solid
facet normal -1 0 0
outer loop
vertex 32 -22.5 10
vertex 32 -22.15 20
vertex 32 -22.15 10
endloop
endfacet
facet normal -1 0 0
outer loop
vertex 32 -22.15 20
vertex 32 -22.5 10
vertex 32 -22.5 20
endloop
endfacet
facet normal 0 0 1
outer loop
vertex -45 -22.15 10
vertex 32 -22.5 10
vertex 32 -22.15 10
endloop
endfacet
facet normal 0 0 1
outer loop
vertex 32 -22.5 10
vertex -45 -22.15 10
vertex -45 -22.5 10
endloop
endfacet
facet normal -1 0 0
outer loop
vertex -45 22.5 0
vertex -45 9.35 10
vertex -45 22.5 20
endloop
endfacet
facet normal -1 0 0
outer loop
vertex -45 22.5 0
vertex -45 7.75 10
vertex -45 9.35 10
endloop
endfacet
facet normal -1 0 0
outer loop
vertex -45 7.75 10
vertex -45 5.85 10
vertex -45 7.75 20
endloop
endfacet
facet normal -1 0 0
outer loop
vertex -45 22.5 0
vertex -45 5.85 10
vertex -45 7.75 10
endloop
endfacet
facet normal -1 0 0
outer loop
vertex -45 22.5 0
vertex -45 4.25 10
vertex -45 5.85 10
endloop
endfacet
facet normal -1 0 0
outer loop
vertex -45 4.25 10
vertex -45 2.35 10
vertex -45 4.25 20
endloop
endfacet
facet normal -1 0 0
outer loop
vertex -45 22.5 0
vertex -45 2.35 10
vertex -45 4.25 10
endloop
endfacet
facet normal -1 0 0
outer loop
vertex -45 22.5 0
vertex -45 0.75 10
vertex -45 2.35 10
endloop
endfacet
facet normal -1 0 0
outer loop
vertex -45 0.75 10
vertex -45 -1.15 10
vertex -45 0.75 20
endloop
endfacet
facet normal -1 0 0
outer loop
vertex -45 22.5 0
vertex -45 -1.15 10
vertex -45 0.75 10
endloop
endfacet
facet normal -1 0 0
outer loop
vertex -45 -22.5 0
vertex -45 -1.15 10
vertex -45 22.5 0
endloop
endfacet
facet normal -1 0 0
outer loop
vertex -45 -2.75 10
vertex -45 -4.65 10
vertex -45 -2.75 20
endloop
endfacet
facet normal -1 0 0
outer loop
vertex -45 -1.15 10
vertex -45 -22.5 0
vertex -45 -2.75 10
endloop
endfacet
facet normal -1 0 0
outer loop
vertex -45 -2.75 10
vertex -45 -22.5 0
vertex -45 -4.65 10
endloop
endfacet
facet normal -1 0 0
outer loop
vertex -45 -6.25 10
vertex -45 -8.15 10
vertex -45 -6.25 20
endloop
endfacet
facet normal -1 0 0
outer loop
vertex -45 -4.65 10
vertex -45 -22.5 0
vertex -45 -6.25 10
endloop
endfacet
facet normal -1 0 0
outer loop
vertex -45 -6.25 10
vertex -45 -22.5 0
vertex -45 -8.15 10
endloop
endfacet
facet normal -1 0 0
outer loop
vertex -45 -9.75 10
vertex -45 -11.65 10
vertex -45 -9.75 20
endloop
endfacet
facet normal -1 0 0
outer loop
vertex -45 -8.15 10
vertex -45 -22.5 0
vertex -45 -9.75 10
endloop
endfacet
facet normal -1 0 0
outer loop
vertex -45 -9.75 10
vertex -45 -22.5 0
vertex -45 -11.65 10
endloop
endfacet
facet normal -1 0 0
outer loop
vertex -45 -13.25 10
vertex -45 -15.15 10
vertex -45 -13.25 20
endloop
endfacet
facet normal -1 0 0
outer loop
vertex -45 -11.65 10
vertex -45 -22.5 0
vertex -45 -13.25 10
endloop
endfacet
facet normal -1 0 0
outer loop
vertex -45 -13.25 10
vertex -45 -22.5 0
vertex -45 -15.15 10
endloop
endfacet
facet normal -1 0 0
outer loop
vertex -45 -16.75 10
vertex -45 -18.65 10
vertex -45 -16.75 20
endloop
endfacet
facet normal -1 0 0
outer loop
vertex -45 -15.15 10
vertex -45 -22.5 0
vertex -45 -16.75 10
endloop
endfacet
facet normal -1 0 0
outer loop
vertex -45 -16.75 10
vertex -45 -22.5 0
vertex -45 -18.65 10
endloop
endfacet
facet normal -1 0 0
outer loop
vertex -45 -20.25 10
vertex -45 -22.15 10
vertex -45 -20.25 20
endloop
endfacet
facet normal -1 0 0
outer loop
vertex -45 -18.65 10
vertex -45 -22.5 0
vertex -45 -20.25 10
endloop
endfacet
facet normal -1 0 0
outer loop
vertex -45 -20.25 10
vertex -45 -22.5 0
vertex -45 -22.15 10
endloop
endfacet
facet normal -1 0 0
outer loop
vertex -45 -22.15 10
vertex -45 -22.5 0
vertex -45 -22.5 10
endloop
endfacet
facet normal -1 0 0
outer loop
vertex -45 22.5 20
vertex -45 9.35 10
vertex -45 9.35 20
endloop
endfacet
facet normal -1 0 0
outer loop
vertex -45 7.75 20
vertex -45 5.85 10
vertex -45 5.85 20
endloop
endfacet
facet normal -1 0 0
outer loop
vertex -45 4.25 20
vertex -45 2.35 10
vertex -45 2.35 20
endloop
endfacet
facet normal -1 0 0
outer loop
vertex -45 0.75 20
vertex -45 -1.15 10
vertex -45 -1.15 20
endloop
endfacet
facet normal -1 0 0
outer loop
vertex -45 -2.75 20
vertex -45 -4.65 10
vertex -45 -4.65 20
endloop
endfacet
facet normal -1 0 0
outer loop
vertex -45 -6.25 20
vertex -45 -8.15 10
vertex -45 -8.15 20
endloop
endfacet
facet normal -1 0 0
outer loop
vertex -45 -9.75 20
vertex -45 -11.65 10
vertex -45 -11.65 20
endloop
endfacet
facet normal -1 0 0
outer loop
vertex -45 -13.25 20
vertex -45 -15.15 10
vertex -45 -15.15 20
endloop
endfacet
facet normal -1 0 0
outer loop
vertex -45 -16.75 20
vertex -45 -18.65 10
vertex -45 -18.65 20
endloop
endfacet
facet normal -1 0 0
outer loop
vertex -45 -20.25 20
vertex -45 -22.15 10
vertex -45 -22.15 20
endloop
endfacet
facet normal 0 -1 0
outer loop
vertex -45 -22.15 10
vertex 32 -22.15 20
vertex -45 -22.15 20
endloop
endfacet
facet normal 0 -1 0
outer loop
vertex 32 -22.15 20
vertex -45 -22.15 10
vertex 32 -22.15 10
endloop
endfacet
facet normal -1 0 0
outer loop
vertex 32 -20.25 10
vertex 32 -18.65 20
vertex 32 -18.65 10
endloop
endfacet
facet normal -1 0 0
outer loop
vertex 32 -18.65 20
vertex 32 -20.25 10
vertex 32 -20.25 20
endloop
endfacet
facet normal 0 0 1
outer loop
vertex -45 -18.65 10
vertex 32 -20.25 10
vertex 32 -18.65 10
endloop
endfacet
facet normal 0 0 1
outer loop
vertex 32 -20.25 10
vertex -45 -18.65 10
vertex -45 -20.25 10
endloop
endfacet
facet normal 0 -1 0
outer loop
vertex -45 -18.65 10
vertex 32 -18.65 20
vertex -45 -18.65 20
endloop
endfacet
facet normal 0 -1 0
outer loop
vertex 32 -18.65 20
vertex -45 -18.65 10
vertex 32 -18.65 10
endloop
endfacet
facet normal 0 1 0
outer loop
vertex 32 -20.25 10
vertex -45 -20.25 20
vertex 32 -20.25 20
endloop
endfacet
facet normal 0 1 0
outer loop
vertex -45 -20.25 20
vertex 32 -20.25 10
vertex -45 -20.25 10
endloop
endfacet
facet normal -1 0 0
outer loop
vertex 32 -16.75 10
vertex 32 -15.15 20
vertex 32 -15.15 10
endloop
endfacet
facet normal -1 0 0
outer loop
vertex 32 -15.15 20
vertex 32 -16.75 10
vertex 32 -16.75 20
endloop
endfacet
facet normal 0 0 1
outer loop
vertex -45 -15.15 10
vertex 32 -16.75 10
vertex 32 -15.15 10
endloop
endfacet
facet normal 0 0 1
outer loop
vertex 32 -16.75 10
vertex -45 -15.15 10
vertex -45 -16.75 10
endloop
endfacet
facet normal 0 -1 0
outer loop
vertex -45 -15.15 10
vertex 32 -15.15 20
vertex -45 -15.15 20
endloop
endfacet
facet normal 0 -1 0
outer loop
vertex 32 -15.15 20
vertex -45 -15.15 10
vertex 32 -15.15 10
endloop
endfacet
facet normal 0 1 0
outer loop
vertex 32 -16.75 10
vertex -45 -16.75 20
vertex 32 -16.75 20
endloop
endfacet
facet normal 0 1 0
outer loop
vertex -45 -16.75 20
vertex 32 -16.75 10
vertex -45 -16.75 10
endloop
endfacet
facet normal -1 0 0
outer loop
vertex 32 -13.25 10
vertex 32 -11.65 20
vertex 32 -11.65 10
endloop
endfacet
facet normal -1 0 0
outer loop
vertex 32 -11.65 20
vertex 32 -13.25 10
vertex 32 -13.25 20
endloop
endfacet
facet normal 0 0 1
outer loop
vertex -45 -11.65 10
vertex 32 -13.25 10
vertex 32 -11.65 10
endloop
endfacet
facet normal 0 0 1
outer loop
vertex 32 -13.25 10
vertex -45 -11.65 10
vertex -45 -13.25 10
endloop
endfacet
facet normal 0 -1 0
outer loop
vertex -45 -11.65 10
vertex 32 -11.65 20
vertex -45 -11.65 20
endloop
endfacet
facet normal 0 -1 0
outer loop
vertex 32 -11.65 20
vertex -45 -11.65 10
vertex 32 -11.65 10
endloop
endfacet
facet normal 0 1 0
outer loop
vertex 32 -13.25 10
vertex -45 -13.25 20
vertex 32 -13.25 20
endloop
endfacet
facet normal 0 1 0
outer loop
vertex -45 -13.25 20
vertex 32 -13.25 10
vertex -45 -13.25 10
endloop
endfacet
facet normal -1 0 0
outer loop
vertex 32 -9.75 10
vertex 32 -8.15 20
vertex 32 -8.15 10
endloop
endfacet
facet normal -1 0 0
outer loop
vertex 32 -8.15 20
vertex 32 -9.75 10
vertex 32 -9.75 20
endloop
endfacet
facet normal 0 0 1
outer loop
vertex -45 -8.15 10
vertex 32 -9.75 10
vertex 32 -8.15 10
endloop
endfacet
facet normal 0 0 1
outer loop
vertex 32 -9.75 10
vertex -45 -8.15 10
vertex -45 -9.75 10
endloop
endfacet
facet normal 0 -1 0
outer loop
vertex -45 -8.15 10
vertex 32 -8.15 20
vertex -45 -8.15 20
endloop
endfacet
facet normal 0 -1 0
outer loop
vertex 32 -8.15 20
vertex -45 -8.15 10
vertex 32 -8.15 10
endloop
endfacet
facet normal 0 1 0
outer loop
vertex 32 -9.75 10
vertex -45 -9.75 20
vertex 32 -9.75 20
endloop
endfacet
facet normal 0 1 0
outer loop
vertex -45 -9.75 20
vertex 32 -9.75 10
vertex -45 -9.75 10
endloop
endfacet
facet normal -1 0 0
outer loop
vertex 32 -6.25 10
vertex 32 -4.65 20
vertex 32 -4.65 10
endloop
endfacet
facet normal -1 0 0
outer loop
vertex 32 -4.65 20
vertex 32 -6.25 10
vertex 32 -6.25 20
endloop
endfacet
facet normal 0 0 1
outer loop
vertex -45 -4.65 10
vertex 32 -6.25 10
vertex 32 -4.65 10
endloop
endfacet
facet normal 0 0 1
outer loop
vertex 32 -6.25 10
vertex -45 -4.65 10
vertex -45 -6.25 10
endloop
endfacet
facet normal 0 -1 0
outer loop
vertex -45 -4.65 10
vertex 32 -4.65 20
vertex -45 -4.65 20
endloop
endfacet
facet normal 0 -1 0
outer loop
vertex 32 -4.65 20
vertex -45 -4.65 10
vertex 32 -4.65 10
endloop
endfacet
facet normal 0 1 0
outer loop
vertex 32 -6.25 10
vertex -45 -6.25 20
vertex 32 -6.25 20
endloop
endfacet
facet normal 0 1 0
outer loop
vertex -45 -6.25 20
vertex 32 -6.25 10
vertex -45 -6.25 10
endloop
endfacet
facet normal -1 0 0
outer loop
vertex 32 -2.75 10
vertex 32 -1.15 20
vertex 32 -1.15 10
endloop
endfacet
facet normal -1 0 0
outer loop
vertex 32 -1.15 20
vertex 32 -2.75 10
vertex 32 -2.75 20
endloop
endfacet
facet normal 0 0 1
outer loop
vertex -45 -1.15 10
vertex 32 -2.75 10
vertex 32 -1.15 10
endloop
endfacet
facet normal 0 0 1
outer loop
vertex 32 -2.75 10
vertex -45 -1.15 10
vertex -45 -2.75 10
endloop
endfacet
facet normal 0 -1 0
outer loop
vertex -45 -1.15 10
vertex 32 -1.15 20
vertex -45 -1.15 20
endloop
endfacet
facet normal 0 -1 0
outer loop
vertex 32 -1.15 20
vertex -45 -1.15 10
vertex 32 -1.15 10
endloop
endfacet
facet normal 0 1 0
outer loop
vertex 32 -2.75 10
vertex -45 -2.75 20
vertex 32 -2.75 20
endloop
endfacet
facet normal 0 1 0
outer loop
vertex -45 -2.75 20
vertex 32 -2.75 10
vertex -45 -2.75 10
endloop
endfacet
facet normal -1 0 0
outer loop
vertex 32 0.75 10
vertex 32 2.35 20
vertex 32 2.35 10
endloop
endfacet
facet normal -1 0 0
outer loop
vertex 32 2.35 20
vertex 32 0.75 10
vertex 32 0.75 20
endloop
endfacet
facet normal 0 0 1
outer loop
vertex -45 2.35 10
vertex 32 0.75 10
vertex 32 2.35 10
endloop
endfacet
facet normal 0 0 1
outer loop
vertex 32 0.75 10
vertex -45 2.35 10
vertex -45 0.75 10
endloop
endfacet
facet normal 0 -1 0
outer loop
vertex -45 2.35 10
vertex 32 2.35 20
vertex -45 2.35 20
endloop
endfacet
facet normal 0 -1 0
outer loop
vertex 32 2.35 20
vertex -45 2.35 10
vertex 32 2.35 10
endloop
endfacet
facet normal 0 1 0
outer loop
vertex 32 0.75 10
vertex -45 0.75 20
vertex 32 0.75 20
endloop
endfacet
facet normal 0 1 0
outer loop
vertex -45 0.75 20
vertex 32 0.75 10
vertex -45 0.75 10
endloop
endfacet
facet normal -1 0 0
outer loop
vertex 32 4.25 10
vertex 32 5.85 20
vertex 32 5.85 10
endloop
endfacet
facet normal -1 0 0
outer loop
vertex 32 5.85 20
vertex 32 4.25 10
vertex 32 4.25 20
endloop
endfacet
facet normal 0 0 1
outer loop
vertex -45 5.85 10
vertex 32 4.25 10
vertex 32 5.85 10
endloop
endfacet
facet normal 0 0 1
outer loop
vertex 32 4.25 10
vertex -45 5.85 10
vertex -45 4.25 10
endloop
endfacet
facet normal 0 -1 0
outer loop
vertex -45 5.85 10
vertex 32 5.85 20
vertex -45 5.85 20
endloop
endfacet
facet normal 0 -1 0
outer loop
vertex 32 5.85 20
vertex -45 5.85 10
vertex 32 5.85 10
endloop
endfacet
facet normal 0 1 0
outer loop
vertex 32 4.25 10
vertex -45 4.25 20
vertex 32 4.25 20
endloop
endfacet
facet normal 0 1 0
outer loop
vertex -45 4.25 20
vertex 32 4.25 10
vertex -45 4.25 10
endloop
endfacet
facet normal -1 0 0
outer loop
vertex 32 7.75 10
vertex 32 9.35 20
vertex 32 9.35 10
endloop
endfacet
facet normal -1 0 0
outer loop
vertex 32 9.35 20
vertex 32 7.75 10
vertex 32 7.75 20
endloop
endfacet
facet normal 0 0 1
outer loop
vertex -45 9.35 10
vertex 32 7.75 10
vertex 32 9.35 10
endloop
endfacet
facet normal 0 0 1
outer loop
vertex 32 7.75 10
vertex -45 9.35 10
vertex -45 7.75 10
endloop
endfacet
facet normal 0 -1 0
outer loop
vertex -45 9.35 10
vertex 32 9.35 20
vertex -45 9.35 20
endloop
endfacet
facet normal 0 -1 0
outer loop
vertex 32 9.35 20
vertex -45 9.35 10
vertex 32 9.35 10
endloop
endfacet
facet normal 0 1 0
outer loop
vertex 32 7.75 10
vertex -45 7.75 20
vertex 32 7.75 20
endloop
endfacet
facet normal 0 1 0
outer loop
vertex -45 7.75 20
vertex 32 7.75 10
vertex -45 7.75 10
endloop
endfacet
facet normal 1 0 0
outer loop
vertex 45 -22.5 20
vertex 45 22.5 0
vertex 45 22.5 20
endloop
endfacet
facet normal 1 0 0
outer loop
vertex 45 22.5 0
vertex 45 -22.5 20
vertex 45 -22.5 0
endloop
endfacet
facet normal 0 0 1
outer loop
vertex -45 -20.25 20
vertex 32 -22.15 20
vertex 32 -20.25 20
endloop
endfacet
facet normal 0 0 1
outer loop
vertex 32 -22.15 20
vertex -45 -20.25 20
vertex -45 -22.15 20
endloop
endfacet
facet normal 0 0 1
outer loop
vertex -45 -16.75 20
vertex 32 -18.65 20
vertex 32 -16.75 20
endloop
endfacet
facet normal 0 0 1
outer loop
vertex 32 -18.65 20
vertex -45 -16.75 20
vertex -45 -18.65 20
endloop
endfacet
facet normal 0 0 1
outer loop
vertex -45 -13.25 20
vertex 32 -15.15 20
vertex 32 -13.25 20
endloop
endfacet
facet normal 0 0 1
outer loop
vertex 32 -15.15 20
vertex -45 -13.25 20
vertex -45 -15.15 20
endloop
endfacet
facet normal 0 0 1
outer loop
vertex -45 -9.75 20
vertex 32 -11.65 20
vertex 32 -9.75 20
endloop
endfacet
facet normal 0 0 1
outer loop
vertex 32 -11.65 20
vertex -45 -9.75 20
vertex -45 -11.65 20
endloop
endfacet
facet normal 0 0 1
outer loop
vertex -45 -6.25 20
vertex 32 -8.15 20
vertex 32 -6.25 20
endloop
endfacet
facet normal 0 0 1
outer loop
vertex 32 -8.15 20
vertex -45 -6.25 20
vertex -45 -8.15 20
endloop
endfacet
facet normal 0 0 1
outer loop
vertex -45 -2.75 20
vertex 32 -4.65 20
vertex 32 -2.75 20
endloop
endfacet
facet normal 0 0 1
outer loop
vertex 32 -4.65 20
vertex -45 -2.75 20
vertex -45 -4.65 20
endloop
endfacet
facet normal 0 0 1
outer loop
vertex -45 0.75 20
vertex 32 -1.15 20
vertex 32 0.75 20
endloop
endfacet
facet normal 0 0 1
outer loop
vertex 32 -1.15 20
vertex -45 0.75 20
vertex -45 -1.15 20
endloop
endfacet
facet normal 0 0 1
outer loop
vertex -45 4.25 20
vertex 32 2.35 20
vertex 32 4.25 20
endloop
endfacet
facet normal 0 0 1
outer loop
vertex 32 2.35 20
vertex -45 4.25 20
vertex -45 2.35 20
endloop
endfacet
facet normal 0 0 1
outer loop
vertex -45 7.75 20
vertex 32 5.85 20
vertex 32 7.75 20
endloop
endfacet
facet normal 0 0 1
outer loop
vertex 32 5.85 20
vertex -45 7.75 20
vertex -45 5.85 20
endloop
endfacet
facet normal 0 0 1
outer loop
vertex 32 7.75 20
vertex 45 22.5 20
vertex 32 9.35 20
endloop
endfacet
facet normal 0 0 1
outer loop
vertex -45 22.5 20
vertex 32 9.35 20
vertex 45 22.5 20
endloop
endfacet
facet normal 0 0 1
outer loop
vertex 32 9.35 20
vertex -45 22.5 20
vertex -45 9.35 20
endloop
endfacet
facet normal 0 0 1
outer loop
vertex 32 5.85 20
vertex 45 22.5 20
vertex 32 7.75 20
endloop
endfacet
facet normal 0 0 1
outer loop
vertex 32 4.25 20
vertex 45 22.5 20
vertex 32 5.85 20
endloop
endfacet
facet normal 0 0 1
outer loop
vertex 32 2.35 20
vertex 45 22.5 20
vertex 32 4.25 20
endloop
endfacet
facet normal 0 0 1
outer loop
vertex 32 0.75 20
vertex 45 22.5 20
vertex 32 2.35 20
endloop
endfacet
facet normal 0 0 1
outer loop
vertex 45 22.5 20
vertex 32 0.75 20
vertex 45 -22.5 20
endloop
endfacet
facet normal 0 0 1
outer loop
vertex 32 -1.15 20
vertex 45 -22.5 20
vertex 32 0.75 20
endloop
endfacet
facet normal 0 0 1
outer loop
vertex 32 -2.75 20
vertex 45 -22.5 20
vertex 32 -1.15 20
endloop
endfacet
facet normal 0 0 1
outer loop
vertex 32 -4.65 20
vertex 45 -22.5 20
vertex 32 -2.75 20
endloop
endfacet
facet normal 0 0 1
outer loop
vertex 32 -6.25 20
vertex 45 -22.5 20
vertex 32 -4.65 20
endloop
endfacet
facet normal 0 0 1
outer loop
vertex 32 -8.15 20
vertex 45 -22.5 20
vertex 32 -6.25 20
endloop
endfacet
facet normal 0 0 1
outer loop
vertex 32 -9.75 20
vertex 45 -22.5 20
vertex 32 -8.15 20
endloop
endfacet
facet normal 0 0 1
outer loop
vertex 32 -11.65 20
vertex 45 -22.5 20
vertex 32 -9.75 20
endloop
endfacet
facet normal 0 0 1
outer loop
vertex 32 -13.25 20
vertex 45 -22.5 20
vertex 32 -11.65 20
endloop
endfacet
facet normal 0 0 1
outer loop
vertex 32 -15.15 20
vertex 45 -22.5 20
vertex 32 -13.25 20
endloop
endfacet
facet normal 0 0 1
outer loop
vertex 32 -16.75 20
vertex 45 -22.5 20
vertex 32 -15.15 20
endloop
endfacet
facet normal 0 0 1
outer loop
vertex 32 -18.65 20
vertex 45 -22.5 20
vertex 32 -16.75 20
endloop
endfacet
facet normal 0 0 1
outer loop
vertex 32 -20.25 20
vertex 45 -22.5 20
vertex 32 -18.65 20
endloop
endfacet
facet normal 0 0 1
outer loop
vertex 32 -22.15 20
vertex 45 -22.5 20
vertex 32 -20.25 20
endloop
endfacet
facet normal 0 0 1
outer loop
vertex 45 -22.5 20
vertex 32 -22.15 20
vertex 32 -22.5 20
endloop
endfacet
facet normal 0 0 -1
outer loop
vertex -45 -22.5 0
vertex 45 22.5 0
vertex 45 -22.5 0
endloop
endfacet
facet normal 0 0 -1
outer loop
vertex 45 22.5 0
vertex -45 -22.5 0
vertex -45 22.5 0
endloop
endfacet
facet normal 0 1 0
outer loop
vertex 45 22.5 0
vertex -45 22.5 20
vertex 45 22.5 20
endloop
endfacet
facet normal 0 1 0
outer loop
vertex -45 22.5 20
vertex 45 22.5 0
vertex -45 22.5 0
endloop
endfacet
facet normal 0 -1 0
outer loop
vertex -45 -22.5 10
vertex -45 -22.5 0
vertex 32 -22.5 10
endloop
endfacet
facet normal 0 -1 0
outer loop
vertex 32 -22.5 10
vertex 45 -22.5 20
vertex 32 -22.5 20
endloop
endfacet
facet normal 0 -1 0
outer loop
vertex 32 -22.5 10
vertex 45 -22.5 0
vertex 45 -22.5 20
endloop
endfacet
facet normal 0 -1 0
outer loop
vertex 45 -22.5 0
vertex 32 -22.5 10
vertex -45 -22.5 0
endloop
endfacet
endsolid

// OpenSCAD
// Drying rack for 10 microscope slides
// Print orientation: base on XY plane, slots open upward (+Z)

// ---------- Block ----------
block_l = 90;    // block length (X)
block_w = 45;    // block width (Y)
block_h = 20;    // block height (Z)

// ---------- Slots ----------
n_slots     = 10;     // number of slots
slot_len    = 77;     // slot length (X)
slot_w      = 1.6;    // slot width (Y)
slot_depth  = 10;     // slot depth from top face (Z)
slot_pitch  = 3.5;    // centre-to-centre spacing in (Y)

// ---------- Misc ----------
eps = 0.5;            // overshoot for clean boolean cuts
$fn = 64;             // curve resolution

// Derived
total_slot_w = n_slots * slot_w + (n_slots - 1) * slot_pitch;   // 32.5 mm
block_y0 = -block_w / 2;                                         // block bottom edge (Y)
slot_y0  = block_y0 + (block_w - total_slot_w) / 2;             // first slot centre (Y)

difference() {
    // Solid block, centred in X
    translate([-block_l / 2, block_y0, 0])
        cube([block_l, block_w, block_h]);

    // 10 parallel slots along X, open at top
    for (i = [0 : n_slots - 1])
        translate([-block_l / 2, slot_y0 + i * slot_pitch, block_h - slot_depth])
            cube([slot_len, slot_w, slot_depth + eps]);
}
